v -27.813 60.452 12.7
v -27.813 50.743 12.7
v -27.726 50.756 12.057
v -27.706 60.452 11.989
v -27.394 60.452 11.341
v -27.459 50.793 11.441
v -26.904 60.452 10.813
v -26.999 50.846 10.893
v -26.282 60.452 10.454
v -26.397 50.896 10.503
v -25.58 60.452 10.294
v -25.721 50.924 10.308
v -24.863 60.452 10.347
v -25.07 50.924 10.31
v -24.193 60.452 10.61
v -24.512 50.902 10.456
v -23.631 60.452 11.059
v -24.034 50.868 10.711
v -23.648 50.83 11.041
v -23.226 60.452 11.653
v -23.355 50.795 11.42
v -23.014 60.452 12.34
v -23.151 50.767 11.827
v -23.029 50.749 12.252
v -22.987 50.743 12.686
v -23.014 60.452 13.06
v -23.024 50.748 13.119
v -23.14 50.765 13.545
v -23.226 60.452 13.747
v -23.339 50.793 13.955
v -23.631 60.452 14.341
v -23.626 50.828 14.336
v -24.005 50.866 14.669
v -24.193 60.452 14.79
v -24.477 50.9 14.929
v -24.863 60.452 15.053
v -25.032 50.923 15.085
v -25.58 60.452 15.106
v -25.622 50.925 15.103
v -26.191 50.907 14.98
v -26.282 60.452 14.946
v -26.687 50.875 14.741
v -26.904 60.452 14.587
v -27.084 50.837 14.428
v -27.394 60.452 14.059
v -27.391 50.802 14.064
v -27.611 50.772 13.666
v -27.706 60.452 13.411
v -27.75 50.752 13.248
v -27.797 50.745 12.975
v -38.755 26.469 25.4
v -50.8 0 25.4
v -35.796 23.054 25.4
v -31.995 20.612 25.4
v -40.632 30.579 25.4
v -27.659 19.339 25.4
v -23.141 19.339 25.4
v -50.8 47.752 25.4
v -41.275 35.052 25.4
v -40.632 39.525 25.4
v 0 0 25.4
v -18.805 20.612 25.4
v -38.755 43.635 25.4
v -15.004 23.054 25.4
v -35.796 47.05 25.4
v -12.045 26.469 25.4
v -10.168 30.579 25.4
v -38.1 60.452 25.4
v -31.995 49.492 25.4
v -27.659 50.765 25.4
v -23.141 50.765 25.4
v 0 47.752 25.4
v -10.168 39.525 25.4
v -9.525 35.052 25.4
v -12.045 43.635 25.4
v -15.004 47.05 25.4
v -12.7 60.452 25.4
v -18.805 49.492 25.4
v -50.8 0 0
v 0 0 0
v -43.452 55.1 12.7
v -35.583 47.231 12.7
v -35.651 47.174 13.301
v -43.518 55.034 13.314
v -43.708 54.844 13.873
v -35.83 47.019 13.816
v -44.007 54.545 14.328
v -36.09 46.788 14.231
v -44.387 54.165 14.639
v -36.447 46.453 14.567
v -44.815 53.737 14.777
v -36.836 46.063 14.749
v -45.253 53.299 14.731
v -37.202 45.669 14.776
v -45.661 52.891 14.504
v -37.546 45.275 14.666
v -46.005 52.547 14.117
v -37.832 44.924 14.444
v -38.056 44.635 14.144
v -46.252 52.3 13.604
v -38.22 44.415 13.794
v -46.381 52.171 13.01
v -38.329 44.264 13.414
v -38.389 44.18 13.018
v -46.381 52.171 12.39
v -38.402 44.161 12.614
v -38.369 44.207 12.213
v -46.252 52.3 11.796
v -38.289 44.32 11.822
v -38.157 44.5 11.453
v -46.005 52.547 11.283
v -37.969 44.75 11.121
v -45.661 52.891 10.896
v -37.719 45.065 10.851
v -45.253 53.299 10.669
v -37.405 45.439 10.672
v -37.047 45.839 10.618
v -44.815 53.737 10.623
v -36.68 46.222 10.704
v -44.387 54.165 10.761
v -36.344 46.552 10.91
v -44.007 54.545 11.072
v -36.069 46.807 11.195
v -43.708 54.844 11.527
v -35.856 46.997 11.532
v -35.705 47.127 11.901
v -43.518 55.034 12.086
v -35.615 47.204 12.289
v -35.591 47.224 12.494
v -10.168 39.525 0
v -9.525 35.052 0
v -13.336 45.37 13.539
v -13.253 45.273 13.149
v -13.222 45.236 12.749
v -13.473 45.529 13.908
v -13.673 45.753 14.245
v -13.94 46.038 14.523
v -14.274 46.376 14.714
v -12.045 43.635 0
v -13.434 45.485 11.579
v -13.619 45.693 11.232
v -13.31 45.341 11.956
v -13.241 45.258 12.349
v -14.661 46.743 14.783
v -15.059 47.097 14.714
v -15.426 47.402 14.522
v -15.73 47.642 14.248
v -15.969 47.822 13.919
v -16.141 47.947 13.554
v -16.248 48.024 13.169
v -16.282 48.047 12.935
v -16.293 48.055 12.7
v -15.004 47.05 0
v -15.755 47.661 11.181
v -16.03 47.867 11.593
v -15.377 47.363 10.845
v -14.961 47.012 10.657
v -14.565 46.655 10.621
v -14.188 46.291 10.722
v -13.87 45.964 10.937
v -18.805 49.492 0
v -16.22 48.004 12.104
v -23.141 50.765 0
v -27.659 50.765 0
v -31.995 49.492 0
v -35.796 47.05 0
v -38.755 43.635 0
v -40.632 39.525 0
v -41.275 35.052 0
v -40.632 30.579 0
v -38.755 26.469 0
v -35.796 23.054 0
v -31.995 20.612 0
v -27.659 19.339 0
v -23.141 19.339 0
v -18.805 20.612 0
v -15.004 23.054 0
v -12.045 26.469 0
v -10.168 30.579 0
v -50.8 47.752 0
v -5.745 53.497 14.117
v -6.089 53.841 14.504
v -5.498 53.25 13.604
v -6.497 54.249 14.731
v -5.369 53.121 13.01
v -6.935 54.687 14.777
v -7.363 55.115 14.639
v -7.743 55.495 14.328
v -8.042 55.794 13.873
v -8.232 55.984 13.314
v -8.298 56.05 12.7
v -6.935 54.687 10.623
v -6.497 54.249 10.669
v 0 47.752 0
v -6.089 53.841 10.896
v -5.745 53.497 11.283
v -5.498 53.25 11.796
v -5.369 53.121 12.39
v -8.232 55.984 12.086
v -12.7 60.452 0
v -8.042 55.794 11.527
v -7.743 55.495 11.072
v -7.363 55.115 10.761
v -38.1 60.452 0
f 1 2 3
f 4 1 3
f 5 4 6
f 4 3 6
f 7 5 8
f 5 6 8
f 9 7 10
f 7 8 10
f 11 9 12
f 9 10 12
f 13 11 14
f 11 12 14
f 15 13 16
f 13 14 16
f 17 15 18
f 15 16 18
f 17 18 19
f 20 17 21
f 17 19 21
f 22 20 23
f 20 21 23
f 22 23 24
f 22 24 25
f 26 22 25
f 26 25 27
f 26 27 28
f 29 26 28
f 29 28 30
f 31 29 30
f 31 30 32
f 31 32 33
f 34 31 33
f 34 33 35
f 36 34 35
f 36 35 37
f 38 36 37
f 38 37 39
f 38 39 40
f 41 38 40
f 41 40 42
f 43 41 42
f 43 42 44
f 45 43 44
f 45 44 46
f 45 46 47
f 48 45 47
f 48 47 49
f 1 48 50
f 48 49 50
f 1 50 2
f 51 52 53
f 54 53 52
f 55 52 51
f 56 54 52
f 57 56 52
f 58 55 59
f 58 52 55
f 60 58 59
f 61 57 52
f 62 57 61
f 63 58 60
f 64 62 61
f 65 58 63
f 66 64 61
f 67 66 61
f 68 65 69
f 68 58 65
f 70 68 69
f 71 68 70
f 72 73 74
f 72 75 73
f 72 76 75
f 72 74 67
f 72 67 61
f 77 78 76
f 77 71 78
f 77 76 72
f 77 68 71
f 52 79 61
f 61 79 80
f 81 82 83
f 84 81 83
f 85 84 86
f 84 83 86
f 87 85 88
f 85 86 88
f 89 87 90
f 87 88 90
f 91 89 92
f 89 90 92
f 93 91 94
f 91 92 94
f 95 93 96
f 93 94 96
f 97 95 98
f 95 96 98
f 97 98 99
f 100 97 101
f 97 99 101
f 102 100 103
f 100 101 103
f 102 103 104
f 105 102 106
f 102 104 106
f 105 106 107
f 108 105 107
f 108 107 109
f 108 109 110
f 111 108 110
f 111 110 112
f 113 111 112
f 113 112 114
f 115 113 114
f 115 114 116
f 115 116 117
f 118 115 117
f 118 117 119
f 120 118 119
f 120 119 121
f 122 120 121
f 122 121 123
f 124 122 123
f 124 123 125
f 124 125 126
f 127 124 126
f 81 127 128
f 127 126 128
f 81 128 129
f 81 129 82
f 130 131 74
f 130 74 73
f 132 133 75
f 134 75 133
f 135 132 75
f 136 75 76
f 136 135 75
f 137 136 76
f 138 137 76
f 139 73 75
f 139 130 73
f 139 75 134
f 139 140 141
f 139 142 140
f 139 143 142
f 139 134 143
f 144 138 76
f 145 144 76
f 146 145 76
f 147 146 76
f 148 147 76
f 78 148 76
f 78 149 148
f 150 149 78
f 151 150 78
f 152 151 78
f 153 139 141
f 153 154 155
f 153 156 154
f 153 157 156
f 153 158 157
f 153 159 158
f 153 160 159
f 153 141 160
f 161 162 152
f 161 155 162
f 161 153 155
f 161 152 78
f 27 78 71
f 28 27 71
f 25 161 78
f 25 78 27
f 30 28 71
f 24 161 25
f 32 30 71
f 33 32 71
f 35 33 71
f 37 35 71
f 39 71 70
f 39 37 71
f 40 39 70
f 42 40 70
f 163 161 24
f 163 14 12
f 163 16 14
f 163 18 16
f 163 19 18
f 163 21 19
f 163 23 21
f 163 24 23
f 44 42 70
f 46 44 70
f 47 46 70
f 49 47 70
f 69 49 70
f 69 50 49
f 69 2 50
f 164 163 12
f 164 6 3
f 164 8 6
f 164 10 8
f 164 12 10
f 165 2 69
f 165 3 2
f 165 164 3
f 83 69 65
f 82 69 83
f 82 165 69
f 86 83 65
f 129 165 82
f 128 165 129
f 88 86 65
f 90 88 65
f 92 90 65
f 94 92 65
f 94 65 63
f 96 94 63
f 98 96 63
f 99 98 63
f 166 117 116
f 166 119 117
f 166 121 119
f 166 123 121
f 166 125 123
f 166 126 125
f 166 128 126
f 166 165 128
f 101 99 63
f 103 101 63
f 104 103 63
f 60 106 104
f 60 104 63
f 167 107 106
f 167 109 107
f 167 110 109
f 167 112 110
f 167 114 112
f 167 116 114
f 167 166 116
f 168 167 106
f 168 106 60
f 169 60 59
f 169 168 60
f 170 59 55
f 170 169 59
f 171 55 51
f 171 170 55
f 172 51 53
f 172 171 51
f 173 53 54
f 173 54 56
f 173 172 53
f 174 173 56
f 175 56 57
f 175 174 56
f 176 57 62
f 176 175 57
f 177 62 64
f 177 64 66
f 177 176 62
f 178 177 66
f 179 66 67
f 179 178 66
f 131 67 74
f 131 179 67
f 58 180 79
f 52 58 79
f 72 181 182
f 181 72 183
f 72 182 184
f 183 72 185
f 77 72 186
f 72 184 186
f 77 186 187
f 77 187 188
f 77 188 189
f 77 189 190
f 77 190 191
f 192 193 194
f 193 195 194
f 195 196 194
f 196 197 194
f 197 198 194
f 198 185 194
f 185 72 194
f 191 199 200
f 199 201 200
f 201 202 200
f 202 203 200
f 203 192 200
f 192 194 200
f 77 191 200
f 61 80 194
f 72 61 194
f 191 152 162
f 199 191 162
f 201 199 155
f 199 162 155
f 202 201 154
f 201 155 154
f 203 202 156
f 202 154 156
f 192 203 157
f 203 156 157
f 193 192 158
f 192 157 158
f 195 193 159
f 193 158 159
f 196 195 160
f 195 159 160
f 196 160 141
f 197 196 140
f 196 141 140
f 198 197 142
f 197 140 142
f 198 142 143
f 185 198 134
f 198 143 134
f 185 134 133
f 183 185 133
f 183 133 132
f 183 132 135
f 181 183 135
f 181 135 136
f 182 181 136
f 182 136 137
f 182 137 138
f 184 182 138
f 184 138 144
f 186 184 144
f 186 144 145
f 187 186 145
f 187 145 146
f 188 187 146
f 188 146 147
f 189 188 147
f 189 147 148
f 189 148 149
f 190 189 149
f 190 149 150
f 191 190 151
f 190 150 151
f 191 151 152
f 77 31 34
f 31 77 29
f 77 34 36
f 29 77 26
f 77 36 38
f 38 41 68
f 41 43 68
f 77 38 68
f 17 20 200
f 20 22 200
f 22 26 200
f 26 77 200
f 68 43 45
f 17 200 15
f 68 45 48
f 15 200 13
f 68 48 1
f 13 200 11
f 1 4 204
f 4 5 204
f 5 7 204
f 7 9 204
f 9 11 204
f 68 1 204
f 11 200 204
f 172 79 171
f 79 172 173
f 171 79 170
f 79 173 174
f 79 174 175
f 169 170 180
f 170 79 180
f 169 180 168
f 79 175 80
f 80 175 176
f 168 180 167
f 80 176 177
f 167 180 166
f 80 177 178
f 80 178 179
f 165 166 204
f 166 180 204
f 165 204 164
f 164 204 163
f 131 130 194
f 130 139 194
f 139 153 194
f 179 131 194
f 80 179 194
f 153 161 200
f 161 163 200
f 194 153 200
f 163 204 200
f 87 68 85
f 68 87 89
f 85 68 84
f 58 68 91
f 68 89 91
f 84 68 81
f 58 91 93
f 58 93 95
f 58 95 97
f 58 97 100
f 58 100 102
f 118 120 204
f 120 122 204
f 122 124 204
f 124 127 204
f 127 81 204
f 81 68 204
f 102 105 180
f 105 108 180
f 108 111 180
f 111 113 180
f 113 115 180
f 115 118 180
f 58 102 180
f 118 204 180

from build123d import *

# Parameters (mm, degrees)
SKETCH2_R                   = 15.875
BOSS_EXTRUDE1_DEPTH         = 25.4
F_1_2_20_TAPPED_HOLE1_D     = 4.826
F_1_2_20_TAPPED_HOLE1_DEPTH = 31.75
F_1_2_20_TAPPED_HOLE1_TIP   = 1.449876674
F_1_2_20_TAPPED_HOLE2_D     = 4.1656
F_1_2_20_TAPPED_HOLE2_DEPTH = 31.75
F_1_2_20_TAPPED_HOLE2_TIP   = 1.251472497
F_1_2_20_TAPPED_HOLE3_D     = 4.1656
F_1_2_20_TAPPED_HOLE3_DEPTH = 31.75
F_1_2_20_TAPPED_HOLE3_TIP   = 1.251472497


with BuildPart() as part:
    # Sketch2 → Boss-Extrude1 (new body)
    with BuildSketch(Plane.XY):
        Polygon((-38.1, 60.452), (-50.8, 47.752), (-50.8, 0), (0, 0), (0, 47.752), (-12.7, 60.452), align=None)
        with Locations((-25.4, 35.052)):
            Circle(SKETCH2_R, mode=Mode.SUBTRACT)
    extrude(amount=BOSS_EXTRUDE1_DEPTH)

    # 1/2-20 Tapped Hole1
    with Locations(Plane(origin=(-25.4, 60.452, 12.7), x_dir=(1, 0, 0), z_dir=(0, 1, 0))):
        with Locations((0, 0)):
            Hole(F_1_2_20_TAPPED_HOLE1_D / 2, depth=F_1_2_20_TAPPED_HOLE1_DEPTH)
            with Locations((0, 0, -(F_1_2_20_TAPPED_HOLE1_DEPTH + F_1_2_20_TAPPED_HOLE1_TIP / 2))):  # 118° drill point
                Cone(0, F_1_2_20_TAPPED_HOLE1_D / 2, F_1_2_20_TAPPED_HOLE1_TIP, mode=Mode.SUBTRACT)

    # 1/2-20 Tapped Hole2
    with Locations(Plane(origin=(-44.924994652, 53.627005348, 12.7), x_dir=(-0.707106781187, -0.707106781187, 0), z_dir=(-0.707106781187, 0.707106781187, 0))):
        with Locations((0, 0)):
            Hole(F_1_2_20_TAPPED_HOLE2_D / 2, depth=F_1_2_20_TAPPED_HOLE2_DEPTH)
            with Locations((0, 0, -(F_1_2_20_TAPPED_HOLE2_DEPTH + F_1_2_20_TAPPED_HOLE2_TIP / 2))):  # 118° drill point
                Cone(0, F_1_2_20_TAPPED_HOLE2_D / 2, F_1_2_20_TAPPED_HOLE2_TIP, mode=Mode.SUBTRACT)

    # 1/2-20 Tapped Hole3
    with Locations(Plane(origin=(-6.824994652, 54.576994652, 12.7), x_dir=(0.707106781187, -0.707106781187, 0), z_dir=(0.707106781187, 0.707106781187, 0))):
        with Locations((0, 0)):
            Hole(F_1_2_20_TAPPED_HOLE3_D / 2, depth=F_1_2_20_TAPPED_HOLE3_DEPTH)
            with Locations((0, 0, -(F_1_2_20_TAPPED_HOLE3_DEPTH + F_1_2_20_TAPPED_HOLE3_TIP / 2))):  # 118° drill point
                Cone(0, F_1_2_20_TAPPED_HOLE3_D / 2, F_1_2_20_TAPPED_HOLE3_TIP, mode=Mode.SUBTRACT)


solid = part.part
